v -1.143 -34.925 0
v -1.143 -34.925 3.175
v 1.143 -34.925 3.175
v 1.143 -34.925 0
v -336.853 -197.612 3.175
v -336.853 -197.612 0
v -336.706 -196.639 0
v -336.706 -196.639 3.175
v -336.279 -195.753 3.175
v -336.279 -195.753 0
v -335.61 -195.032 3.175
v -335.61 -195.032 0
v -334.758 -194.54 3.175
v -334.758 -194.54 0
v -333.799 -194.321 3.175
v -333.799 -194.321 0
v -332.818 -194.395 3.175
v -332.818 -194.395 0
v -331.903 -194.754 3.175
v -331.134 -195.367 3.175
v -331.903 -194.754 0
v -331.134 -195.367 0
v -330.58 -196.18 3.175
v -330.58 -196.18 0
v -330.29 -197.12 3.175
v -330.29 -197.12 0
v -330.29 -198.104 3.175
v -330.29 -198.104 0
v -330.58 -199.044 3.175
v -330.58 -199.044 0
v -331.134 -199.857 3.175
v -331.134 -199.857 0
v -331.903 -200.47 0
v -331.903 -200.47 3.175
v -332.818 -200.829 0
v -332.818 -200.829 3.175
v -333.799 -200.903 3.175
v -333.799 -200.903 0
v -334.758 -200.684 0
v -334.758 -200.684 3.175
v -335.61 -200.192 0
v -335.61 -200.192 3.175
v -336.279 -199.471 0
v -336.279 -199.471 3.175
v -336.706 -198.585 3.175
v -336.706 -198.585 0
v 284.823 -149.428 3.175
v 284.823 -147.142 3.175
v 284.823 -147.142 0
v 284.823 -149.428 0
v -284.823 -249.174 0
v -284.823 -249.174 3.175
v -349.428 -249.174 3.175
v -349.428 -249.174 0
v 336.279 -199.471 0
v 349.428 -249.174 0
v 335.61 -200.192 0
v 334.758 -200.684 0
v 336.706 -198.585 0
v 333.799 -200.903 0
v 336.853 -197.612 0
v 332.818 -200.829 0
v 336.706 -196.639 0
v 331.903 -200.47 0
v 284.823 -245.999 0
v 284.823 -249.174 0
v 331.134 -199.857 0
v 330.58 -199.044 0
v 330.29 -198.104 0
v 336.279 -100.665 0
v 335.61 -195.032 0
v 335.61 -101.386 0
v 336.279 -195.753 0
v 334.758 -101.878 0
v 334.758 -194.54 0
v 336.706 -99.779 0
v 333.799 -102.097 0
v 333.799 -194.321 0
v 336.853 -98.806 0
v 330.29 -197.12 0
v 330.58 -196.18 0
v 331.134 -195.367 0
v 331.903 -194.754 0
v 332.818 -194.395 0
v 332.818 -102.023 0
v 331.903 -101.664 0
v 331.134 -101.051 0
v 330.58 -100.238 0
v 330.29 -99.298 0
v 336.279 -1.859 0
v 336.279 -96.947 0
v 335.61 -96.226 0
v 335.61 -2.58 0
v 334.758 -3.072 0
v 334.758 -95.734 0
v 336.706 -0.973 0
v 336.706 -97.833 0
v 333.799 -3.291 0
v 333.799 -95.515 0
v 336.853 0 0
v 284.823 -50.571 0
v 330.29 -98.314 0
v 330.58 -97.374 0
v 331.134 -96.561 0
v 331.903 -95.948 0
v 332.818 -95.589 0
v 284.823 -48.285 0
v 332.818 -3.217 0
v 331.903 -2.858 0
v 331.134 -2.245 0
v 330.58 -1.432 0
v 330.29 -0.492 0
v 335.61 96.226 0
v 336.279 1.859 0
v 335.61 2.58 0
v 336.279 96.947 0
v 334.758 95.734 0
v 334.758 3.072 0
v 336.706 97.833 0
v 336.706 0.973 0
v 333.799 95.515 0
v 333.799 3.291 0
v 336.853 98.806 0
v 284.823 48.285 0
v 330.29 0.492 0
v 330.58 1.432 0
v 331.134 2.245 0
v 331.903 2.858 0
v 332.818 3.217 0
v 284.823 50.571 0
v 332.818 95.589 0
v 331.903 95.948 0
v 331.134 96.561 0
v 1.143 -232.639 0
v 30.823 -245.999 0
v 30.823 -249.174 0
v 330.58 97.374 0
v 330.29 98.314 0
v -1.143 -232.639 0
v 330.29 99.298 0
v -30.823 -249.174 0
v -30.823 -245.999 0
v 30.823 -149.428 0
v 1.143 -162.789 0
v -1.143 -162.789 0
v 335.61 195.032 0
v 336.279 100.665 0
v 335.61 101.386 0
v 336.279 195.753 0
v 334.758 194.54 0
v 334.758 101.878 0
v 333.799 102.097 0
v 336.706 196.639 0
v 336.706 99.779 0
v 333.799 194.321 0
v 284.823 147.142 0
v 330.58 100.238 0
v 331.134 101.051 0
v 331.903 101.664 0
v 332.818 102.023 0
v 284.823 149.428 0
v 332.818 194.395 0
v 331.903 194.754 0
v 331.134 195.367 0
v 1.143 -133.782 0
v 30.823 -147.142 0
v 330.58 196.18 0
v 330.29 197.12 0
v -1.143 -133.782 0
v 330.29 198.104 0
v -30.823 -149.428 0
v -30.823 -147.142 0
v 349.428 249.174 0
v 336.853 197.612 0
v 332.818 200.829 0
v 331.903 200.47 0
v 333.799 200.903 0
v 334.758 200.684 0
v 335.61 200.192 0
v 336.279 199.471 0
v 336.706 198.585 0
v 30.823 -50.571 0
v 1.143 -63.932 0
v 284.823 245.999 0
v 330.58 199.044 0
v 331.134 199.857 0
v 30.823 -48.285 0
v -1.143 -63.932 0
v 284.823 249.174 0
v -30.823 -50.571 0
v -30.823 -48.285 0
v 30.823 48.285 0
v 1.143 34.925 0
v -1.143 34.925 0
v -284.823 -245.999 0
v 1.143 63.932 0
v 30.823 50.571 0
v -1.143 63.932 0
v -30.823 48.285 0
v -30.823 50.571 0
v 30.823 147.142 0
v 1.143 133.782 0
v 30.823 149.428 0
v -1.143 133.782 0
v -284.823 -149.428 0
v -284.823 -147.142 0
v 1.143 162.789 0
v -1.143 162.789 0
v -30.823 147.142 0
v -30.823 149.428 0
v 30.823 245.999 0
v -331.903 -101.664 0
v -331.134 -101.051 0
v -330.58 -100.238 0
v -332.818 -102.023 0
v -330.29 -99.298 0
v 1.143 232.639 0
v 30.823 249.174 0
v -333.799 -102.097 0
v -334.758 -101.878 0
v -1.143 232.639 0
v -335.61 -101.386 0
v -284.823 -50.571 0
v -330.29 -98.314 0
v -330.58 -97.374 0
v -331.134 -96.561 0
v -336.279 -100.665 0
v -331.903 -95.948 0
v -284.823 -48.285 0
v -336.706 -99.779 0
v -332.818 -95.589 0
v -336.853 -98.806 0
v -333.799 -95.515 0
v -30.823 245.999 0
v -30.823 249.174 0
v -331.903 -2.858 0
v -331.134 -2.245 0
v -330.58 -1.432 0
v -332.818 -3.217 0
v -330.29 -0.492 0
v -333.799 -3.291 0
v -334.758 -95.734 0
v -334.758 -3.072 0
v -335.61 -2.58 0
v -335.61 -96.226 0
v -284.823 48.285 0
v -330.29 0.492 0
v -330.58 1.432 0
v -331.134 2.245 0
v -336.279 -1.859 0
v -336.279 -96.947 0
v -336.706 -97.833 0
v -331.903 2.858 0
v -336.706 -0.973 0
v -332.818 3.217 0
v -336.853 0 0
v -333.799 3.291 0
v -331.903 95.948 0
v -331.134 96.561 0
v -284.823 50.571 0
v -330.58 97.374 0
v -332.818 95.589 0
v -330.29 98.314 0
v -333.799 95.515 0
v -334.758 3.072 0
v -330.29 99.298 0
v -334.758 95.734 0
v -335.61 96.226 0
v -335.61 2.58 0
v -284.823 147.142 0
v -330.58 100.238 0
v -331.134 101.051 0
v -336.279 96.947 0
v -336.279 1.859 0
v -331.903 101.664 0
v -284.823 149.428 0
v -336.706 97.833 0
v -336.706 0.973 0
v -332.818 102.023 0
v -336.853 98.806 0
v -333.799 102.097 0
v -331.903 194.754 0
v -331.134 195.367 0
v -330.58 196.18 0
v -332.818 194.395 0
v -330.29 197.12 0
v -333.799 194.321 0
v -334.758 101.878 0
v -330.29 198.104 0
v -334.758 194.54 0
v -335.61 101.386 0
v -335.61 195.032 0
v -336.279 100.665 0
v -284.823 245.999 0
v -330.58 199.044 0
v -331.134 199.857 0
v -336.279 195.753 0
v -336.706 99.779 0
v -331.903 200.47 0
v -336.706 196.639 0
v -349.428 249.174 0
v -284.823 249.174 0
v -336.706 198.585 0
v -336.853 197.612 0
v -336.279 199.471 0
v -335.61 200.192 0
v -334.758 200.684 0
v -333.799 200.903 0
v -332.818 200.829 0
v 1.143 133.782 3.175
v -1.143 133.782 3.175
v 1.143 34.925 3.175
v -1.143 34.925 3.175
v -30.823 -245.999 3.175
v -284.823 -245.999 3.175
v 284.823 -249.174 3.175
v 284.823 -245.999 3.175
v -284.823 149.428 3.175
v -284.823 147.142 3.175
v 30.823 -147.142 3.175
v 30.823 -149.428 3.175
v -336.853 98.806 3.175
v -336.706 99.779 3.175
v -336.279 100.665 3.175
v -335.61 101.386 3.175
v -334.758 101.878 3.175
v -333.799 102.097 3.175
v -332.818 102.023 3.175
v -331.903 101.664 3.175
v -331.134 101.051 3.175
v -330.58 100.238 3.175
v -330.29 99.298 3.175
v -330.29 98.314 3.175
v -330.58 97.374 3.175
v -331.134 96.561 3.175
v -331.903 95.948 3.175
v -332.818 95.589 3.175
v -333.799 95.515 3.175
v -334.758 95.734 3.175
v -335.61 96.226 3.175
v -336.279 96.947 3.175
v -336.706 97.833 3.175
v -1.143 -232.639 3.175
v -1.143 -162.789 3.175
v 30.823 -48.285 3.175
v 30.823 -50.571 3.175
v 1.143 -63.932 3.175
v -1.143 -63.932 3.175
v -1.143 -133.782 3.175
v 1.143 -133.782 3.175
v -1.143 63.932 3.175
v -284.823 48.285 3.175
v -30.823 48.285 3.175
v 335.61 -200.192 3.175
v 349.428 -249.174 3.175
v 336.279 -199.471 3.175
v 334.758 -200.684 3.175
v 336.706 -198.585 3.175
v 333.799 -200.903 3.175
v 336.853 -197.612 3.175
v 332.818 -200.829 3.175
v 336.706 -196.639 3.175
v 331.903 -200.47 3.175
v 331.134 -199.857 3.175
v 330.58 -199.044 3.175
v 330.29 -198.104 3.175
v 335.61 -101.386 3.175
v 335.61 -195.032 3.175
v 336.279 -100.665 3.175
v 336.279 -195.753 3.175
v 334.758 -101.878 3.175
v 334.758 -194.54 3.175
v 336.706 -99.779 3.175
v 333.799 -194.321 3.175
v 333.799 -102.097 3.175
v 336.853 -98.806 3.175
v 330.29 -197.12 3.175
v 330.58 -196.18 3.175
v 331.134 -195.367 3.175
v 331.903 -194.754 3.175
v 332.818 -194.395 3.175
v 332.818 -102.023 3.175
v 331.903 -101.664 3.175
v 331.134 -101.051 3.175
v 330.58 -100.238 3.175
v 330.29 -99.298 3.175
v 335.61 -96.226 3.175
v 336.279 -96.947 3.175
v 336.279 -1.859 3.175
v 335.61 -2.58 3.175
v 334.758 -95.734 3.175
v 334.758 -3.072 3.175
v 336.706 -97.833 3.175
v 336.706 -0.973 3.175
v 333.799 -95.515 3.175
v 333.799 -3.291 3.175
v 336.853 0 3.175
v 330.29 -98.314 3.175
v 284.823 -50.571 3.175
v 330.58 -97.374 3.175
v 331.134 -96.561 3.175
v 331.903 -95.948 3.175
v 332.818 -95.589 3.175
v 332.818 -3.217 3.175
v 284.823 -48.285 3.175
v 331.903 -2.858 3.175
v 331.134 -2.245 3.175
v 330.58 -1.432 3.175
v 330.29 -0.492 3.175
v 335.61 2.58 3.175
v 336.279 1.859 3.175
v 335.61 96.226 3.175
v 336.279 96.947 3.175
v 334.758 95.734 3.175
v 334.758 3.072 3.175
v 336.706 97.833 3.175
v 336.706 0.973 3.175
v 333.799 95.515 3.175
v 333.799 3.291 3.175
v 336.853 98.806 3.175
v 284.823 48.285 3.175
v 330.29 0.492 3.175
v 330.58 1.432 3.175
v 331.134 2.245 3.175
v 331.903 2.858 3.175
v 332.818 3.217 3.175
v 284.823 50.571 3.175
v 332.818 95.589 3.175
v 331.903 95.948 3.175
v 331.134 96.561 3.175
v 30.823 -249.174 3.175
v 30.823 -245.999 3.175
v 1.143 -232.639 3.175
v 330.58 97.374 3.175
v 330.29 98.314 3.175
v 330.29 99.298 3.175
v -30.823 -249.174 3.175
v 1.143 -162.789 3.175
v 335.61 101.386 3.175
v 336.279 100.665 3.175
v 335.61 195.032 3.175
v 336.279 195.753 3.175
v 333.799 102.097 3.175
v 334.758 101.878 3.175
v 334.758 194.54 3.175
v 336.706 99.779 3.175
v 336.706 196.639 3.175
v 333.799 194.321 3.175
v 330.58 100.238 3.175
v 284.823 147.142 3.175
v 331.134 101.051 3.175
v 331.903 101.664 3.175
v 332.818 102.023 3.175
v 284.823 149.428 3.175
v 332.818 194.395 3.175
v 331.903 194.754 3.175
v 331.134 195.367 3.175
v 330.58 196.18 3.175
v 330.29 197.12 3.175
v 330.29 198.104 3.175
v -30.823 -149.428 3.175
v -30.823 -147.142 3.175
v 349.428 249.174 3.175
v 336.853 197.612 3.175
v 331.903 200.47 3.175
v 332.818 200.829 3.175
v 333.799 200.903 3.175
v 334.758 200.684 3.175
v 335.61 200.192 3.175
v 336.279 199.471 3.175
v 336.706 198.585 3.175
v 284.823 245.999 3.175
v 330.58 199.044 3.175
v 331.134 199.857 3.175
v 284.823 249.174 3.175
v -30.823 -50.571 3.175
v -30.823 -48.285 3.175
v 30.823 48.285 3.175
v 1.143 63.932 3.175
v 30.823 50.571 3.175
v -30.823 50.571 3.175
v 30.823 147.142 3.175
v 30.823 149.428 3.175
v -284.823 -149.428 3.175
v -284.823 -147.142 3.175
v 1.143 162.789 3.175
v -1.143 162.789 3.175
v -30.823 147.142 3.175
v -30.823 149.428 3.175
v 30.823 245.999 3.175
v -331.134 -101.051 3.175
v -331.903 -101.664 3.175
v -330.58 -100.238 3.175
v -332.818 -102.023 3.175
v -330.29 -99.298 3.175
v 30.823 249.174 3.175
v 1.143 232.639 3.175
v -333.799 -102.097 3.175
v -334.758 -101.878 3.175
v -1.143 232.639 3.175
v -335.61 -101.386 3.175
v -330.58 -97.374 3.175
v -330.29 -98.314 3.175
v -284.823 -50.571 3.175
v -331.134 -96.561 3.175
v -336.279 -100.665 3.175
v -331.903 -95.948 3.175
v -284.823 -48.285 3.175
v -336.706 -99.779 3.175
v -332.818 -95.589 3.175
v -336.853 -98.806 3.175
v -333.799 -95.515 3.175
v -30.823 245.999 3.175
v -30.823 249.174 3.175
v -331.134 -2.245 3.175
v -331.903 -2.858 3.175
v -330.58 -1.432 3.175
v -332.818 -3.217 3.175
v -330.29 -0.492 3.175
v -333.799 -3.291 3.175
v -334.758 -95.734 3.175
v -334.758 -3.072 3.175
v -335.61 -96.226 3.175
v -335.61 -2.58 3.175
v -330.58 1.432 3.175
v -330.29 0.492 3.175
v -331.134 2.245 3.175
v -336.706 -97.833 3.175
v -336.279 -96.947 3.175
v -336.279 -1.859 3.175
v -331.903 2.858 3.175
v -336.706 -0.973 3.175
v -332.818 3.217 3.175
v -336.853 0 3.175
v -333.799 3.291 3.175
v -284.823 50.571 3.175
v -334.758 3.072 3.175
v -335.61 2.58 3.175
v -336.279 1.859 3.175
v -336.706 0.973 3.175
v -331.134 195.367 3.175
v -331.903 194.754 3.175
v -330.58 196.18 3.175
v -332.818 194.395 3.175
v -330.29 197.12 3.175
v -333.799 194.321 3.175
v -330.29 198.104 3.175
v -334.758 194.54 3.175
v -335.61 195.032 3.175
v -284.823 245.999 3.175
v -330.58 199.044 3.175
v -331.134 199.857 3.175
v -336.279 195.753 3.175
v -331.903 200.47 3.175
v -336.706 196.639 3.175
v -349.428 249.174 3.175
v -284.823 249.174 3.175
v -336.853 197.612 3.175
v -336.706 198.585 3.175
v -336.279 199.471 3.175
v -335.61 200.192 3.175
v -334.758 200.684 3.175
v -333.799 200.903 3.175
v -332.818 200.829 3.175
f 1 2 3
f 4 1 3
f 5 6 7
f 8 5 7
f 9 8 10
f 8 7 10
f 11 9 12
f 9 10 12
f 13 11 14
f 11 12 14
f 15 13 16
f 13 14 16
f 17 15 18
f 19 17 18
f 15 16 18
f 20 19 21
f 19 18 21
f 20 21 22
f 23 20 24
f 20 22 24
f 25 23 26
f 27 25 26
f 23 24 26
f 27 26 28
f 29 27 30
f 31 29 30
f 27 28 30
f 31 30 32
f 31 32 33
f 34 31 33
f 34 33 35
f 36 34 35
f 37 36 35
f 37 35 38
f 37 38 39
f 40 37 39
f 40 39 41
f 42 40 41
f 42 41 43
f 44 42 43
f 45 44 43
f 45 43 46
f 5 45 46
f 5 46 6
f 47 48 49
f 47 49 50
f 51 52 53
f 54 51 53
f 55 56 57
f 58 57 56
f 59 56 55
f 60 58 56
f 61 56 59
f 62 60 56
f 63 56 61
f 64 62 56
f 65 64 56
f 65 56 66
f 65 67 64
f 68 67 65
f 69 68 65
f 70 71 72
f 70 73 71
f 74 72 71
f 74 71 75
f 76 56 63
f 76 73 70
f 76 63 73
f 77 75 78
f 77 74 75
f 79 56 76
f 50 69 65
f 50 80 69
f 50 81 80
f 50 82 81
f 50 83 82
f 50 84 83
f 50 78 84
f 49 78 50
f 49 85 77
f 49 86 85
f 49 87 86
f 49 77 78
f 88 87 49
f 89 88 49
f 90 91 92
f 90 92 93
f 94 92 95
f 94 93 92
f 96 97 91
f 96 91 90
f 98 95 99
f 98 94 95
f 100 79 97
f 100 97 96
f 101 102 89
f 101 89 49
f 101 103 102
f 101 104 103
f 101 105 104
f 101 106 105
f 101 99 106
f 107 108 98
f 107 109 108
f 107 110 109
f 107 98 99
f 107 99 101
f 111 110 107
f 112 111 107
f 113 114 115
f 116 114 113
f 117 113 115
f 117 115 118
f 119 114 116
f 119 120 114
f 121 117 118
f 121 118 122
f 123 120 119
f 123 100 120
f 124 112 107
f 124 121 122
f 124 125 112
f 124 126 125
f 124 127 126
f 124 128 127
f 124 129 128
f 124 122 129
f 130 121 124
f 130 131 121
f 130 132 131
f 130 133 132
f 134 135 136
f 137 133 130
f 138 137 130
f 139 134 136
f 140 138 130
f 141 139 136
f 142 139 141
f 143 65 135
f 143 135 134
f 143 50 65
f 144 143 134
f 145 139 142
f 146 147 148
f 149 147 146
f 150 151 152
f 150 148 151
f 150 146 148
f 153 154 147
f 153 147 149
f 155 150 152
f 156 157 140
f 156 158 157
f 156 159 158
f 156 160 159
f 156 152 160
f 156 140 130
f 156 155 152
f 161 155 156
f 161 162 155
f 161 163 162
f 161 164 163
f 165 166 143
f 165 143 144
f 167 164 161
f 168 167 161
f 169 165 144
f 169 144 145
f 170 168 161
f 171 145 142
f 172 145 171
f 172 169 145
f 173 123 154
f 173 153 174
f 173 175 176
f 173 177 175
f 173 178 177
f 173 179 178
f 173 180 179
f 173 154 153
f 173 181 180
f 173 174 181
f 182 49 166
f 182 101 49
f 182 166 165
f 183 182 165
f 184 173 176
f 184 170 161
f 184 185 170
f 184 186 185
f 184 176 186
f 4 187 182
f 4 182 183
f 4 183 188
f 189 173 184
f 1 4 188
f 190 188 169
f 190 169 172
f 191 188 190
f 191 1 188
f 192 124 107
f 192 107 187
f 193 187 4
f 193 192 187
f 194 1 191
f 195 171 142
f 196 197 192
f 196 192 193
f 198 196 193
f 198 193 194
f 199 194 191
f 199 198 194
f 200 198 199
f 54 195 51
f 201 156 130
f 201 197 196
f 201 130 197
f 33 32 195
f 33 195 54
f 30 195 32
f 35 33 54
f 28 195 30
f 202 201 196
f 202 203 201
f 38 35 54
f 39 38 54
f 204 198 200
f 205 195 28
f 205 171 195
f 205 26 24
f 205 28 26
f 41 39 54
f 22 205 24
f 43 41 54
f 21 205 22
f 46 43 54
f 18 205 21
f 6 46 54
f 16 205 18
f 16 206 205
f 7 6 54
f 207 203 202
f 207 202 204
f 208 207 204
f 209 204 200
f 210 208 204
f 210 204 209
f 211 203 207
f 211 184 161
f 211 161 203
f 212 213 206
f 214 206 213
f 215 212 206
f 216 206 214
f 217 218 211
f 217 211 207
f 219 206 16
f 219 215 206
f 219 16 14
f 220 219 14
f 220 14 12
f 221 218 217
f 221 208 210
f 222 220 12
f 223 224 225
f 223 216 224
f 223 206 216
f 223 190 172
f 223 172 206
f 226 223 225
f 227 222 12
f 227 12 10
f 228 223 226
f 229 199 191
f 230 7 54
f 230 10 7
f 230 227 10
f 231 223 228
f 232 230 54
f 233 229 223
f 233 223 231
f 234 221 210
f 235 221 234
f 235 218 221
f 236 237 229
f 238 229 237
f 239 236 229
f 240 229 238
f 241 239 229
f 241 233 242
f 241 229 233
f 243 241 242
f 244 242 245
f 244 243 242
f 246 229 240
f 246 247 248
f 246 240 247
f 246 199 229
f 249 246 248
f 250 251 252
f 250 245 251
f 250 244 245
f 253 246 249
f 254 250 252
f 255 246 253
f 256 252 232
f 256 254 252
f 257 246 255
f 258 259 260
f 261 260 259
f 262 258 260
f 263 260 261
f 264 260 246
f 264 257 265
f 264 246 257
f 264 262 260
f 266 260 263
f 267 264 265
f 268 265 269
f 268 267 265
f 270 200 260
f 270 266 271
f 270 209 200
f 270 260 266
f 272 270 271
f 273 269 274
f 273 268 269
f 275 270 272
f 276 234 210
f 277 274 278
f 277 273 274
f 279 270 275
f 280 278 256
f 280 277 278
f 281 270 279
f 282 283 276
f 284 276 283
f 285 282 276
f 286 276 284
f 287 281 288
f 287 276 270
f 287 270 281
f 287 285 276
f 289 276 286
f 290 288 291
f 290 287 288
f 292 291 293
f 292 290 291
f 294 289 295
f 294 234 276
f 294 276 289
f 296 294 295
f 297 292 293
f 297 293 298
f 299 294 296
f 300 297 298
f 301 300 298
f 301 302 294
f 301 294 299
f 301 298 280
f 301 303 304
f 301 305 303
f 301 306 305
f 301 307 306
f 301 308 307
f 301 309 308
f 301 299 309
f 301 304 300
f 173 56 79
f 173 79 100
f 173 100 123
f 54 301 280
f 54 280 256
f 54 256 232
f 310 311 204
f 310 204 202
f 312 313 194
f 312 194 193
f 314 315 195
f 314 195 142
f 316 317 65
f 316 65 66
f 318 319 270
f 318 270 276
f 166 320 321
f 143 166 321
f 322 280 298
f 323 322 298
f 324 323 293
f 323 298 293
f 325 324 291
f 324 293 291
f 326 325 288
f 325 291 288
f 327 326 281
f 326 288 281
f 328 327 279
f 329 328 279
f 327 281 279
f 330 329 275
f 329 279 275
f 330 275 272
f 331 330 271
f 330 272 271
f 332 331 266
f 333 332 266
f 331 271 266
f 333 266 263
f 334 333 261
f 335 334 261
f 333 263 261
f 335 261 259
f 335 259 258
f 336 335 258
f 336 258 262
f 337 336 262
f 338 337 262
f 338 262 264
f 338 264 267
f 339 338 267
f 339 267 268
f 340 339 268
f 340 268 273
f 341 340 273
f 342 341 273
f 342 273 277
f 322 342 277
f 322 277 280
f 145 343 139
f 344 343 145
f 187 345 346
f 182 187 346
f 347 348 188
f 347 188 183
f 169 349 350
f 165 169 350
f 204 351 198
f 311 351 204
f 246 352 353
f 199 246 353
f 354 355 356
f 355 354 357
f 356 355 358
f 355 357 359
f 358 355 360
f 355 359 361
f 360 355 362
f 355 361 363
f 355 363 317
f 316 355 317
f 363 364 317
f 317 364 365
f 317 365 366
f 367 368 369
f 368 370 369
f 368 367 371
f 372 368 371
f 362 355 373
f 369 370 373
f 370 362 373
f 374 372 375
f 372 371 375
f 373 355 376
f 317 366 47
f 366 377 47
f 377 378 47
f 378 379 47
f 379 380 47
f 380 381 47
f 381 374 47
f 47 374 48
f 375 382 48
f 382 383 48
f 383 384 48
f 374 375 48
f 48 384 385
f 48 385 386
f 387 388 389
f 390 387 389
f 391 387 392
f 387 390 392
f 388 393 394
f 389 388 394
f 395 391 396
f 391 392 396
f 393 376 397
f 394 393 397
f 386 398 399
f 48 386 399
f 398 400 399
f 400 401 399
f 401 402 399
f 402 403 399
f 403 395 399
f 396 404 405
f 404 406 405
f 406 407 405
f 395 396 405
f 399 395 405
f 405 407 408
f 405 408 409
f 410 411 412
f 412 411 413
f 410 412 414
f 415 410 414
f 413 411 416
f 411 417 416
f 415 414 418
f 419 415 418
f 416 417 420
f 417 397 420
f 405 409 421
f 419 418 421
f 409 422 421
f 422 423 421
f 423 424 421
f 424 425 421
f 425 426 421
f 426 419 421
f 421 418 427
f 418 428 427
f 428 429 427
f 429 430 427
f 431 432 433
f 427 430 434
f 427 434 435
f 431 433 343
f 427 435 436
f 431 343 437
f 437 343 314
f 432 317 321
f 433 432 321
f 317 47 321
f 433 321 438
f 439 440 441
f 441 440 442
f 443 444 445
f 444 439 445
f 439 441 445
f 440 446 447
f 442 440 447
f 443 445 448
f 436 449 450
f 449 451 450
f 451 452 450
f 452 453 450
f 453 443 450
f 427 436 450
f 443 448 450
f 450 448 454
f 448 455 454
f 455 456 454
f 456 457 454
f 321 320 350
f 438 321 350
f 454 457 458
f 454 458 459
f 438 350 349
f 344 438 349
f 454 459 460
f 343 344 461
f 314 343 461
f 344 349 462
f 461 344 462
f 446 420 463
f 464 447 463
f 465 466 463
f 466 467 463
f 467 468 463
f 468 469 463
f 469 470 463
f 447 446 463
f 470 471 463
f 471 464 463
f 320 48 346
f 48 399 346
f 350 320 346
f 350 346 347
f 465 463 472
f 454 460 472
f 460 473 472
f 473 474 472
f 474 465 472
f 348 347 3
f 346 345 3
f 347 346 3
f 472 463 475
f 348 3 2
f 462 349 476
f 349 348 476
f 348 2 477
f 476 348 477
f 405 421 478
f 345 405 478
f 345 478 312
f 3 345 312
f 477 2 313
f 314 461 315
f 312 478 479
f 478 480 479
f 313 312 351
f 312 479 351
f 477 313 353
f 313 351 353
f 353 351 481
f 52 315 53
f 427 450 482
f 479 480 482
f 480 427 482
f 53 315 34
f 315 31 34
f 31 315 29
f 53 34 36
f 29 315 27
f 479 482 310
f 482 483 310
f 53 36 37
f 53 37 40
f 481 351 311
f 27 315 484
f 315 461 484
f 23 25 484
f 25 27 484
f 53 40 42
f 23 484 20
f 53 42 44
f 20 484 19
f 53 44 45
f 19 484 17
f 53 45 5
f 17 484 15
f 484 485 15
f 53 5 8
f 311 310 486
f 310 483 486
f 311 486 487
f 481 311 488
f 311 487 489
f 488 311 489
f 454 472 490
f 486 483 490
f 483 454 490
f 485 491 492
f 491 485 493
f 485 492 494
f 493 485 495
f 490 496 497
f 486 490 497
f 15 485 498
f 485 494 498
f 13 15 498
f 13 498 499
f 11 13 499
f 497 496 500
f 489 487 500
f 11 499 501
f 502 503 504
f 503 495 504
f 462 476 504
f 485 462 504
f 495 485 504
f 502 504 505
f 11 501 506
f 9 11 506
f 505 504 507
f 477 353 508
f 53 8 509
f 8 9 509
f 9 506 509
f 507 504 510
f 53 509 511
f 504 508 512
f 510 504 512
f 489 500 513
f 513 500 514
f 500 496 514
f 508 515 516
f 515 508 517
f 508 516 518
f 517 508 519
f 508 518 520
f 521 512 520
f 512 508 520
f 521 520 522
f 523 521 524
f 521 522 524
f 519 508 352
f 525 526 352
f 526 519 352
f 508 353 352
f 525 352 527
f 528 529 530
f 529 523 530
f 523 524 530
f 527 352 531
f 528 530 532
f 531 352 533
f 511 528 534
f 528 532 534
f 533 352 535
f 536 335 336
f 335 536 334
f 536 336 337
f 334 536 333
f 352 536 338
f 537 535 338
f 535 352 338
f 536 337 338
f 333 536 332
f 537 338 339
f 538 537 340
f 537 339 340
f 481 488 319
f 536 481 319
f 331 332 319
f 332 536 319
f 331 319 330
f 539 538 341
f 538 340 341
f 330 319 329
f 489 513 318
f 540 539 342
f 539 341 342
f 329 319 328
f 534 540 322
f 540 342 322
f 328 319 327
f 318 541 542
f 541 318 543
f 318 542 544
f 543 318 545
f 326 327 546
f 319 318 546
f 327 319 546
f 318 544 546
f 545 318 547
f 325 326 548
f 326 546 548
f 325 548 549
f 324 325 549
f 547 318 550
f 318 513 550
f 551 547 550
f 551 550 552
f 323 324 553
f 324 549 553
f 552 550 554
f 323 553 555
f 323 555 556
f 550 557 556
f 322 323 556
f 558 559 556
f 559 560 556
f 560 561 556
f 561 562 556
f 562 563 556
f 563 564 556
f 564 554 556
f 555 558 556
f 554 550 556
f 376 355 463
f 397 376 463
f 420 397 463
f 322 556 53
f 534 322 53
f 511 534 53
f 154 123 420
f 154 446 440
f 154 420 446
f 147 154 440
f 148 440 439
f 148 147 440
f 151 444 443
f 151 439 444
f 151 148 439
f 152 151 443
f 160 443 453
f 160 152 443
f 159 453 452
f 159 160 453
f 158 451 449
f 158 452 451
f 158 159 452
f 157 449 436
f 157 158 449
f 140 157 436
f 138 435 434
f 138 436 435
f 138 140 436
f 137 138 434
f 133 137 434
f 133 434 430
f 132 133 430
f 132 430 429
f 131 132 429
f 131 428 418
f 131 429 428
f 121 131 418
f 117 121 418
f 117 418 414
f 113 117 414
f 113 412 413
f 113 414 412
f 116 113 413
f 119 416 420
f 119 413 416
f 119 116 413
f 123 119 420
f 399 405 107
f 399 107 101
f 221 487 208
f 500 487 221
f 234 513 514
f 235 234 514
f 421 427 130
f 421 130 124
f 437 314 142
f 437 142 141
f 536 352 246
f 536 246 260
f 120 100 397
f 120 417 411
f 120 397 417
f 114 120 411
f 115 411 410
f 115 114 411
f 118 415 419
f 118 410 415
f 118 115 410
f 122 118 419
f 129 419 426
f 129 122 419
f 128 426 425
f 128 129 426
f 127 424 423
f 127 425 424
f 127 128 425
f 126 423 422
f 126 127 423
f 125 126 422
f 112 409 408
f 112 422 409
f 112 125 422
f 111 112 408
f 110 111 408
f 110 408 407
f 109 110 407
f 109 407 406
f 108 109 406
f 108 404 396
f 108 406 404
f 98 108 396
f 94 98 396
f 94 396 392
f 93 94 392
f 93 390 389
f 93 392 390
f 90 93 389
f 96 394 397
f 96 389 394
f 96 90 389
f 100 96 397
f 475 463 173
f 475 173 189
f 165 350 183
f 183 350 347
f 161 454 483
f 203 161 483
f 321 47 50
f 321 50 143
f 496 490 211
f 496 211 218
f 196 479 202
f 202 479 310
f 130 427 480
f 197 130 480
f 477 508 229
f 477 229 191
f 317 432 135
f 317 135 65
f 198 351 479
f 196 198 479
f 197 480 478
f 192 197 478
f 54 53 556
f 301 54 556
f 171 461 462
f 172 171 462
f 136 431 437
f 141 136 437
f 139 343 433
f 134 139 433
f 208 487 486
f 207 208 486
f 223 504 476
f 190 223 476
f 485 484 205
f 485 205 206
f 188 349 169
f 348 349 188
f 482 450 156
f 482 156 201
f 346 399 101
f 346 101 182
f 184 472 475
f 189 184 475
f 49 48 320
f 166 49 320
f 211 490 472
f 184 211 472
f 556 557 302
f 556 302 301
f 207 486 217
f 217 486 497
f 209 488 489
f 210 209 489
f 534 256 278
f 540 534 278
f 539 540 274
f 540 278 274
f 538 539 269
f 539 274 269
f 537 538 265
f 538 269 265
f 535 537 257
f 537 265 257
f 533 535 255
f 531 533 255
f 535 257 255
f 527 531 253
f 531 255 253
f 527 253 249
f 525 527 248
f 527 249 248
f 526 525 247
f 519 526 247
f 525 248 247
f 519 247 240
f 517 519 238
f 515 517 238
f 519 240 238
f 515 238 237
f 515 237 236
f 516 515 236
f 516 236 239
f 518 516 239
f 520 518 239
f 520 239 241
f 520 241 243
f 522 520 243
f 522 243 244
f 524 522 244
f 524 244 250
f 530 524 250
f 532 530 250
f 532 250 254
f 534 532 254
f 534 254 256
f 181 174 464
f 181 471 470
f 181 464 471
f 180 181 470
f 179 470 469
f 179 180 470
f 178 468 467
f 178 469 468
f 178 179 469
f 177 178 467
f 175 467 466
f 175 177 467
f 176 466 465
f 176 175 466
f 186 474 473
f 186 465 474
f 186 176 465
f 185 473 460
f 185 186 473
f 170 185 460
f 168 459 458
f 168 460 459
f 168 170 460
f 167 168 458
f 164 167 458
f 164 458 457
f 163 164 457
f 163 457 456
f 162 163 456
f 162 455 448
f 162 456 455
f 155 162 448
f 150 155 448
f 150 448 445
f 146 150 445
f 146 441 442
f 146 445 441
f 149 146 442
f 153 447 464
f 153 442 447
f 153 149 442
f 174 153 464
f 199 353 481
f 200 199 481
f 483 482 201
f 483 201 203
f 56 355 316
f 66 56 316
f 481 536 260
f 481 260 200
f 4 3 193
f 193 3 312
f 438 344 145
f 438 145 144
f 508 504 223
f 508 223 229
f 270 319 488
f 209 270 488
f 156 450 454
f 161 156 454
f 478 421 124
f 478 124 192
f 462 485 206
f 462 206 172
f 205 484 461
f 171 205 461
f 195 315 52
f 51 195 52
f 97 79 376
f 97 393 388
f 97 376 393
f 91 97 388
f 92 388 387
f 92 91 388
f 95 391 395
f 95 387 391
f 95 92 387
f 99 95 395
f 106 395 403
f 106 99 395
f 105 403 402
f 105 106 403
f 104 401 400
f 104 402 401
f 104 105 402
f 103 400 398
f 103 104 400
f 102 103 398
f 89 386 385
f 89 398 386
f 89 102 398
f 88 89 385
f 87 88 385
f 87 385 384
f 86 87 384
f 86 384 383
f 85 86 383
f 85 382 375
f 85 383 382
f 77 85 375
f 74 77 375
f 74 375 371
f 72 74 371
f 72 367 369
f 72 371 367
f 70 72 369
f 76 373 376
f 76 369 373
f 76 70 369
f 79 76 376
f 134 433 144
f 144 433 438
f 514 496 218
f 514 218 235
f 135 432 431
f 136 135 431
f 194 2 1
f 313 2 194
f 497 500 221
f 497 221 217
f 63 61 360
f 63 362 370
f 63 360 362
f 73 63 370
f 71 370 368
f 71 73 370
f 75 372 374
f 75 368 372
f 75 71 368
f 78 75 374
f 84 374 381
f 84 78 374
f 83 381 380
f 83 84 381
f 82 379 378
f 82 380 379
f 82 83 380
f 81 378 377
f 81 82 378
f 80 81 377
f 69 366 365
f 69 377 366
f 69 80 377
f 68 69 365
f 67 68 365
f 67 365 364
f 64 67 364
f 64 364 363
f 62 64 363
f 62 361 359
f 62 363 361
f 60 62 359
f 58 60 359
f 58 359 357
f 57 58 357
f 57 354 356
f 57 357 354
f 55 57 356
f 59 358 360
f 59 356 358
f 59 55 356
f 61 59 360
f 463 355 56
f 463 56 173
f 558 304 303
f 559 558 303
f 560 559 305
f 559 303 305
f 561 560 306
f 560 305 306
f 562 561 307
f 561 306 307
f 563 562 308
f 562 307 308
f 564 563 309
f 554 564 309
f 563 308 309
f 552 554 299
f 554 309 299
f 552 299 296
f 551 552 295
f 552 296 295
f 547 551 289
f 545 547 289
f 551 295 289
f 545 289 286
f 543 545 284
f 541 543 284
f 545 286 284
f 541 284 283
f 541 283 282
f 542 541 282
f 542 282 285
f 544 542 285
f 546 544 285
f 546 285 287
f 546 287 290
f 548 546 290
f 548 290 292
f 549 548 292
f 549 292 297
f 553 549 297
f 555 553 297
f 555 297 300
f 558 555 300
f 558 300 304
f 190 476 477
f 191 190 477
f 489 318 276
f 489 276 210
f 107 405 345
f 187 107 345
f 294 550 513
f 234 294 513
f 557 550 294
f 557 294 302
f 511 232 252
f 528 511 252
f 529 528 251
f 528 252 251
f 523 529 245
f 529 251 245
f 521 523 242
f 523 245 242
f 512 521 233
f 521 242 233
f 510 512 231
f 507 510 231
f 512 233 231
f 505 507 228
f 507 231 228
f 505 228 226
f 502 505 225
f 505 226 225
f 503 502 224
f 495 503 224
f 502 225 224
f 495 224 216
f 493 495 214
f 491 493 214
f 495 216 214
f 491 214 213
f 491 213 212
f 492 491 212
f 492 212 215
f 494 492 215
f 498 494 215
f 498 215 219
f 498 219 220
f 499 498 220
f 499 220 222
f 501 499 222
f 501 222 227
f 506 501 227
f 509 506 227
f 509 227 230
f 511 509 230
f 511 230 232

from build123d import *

# Parameters (mm, degrees)
MASTER_SKETCH_W         = 635.3556
MASTER_SKETCH_H         = 498.348
BOSS_EXTRUDE1_DEPTH     = 3.175
SKETCH2_W               = 31.75
SKETCH2_H               = 498.348
BOSS_EXTRUDE2_DEPTH     = 3.175
M6_CLEARANCE_HOLE1_D    = 6.6
SKETCH5_W               = 2.286
SKETCH5_H               = 69.85
CUT_EXTRUDE1_DEPTH      = 430.182420788
LPATTERN1_COUNT         = 5
LPATTERN1_PITCH         = 98.8568
SKETCH6_W               = 254
SKETCH6_H               = 3.175
CUT_EXTRUDE2_DEPTH      = 430.182420788
SKETCH7_W               = 254
SKETCH7_H               = 2.286
CUT_EXTRUDE3_DEPTH      = 430.182420788
LPATTERN2_COUNT         = 4
LPATTERN2_PITCH         = 98.8568
MIRROR4_COPY_1_SKETCH_W = 254
MIRROR4_COPY_1_SKETCH_H = 2.286
MIRROR4_COPY_1_DEPTH    = 430.182420788
MIRROR4_COPY_2_SKETCH_W = 254
MIRROR4_COPY_2_SKETCH_H = 2.286
MIRROR4_COPY_2_DEPTH    = 430.182420788
MIRROR4_COPY_3_SKETCH_W = 254
MIRROR4_COPY_3_SKETCH_H = 2.286
MIRROR4_COPY_3_DEPTH    = 430.182420788


with BuildPart() as part:
    # Master Sketch → Boss-Extrude1 (new body)
    with BuildSketch(Plane.XY):
        Rectangle(MASTER_SKETCH_W, MASTER_SKETCH_H)
    extrude(amount=BOSS_EXTRUDE1_DEPTH)

    # Sketch2 → Boss-Extrude2 (add)
    with BuildSketch(Plane.XY.offset(3.175)):
        with Locations((-333.5528, 0)):
            Rectangle(SKETCH2_W, SKETCH2_H)
    boss_extrude2 = extrude(amount=-BOSS_EXTRUDE2_DEPTH)

    # M6 Clearance Hole1 (through all)
    with Locations(Plane.XY.offset(3.175)):
        with Locations((-333.5528, -197.612), (-333.5528, -98.806), (-333.5528, 0), (-333.5528, 98.806), (-333.5528, 197.612)):
            m6_clearance_hole1 = Hole(M6_CLEARANCE_HOLE1_D / 2)

    # Mirror1: Boss-Extrude2, M6 Clearance Hole1 across plane
    add(boss_extrude2.mirror(Plane(origin=(0, 0, 0), x_dir=(0, 0, 1), z_dir=(1, 0, 0))))
    add(m6_clearance_hole1.mirror(Plane(origin=(0, 0, 0), x_dir=(0, 0, 1), z_dir=(1, 0, 0))), mode=Mode.SUBTRACT)

    # Sketch5 → Cut-Extrude1 (cut, through all)
    with BuildSketch(Plane.XY.offset(3.175)):
        with Locations((0, 197.7136)):
            Rectangle(SKETCH5_W, SKETCH5_H)
    cut_extrude1 = extrude(amount=-CUT_EXTRUDE1_DEPTH, mode=Mode.SUBTRACT)

    # LPattern1: Cut-Extrude1 ×5
    with Locations(*[(0, -i * LPATTERN1_PITCH, 0) for i in range(1, LPATTERN1_COUNT)]):
        add(cut_extrude1, mode=Mode.SUBTRACT)

    # Sketch6 → Cut-Extrude2 (cut, through all)
    with BuildSketch(Plane.XY.offset(3.175)):
        with Locations((-157.8229, 247.5865)):
            Rectangle(SKETCH6_W, SKETCH6_H)
        with Locations((157.8229, 247.5865)):
            Rectangle(SKETCH6_W, SKETCH6_H)
    cut_extrude2 = extrude(amount=-CUT_EXTRUDE2_DEPTH, mode=Mode.SUBTRACT)

    # Mirror3: Cut-Extrude2 across plane
    add(cut_extrude2.mirror(Plane.ZX), mode=Mode.SUBTRACT)

    # Sketch7 → Cut-Extrude3 (cut, through all)
    with BuildSketch(Plane.XY.offset(3.175)):
        with Locations((-157.8229, 148.2852)):
            Rectangle(SKETCH7_W, SKETCH7_H)
    cut_extrude3 = extrude(amount=-CUT_EXTRUDE3_DEPTH, mode=Mode.SUBTRACT)

    # LPattern2: Cut-Extrude3 ×4
    with Locations(*[(0, -i * LPATTERN2_PITCH, 0) for i in range(1, LPATTERN2_COUNT)]):
        add(cut_extrude3, mode=Mode.SUBTRACT)

    # Mirror4: Cut-Extrude3 across plane
    add(cut_extrude3.mirror(Plane(origin=(0, 0, 0), x_dir=(0, 0, 1), z_dir=(1, 0, 0))), mode=Mode.SUBTRACT)

    # Mirror4 copy 1 sketch → Mirror4 copy 1 (cut, through all)
    with BuildSketch(Plane(origin=(0, -98.8568, 3.175), x_dir=(-1, 0, 0), z_dir=(0, 0, 1))):
        with Locations((-157.8229, -148.2852)):
            Rectangle(MIRROR4_COPY_1_SKETCH_W, MIRROR4_COPY_1_SKETCH_H)
    extrude(amount=-MIRROR4_COPY_1_DEPTH, mode=Mode.SUBTRACT)

    # Mirror4 copy 2 sketch → Mirror4 copy 2 (cut, through all)
    with BuildSketch(Plane(origin=(0, -197.7136, 3.175), x_dir=(-1, 0, 0), z_dir=(0, 0, 1))):
        with Locations((-157.8229, -148.2852)):
            Rectangle(MIRROR4_COPY_2_SKETCH_W, MIRROR4_COPY_2_SKETCH_H)
    extrude(amount=-MIRROR4_COPY_2_DEPTH, mode=Mode.SUBTRACT)

    # Mirror4 copy 3 sketch → Mirror4 copy 3 (cut, through all)
    with BuildSketch(Plane(origin=(0, -296.5704, 3.175), x_dir=(-1, 0, 0), z_dir=(0, 0, 1))):
        with Locations((-157.8229, -148.2852)):
            Rectangle(MIRROR4_COPY_3_SKETCH_W, MIRROR4_COPY_3_SKETCH_H)
    extrude(amount=-MIRROR4_COPY_3_DEPTH, mode=Mode.SUBTRACT)


solid = part.part
